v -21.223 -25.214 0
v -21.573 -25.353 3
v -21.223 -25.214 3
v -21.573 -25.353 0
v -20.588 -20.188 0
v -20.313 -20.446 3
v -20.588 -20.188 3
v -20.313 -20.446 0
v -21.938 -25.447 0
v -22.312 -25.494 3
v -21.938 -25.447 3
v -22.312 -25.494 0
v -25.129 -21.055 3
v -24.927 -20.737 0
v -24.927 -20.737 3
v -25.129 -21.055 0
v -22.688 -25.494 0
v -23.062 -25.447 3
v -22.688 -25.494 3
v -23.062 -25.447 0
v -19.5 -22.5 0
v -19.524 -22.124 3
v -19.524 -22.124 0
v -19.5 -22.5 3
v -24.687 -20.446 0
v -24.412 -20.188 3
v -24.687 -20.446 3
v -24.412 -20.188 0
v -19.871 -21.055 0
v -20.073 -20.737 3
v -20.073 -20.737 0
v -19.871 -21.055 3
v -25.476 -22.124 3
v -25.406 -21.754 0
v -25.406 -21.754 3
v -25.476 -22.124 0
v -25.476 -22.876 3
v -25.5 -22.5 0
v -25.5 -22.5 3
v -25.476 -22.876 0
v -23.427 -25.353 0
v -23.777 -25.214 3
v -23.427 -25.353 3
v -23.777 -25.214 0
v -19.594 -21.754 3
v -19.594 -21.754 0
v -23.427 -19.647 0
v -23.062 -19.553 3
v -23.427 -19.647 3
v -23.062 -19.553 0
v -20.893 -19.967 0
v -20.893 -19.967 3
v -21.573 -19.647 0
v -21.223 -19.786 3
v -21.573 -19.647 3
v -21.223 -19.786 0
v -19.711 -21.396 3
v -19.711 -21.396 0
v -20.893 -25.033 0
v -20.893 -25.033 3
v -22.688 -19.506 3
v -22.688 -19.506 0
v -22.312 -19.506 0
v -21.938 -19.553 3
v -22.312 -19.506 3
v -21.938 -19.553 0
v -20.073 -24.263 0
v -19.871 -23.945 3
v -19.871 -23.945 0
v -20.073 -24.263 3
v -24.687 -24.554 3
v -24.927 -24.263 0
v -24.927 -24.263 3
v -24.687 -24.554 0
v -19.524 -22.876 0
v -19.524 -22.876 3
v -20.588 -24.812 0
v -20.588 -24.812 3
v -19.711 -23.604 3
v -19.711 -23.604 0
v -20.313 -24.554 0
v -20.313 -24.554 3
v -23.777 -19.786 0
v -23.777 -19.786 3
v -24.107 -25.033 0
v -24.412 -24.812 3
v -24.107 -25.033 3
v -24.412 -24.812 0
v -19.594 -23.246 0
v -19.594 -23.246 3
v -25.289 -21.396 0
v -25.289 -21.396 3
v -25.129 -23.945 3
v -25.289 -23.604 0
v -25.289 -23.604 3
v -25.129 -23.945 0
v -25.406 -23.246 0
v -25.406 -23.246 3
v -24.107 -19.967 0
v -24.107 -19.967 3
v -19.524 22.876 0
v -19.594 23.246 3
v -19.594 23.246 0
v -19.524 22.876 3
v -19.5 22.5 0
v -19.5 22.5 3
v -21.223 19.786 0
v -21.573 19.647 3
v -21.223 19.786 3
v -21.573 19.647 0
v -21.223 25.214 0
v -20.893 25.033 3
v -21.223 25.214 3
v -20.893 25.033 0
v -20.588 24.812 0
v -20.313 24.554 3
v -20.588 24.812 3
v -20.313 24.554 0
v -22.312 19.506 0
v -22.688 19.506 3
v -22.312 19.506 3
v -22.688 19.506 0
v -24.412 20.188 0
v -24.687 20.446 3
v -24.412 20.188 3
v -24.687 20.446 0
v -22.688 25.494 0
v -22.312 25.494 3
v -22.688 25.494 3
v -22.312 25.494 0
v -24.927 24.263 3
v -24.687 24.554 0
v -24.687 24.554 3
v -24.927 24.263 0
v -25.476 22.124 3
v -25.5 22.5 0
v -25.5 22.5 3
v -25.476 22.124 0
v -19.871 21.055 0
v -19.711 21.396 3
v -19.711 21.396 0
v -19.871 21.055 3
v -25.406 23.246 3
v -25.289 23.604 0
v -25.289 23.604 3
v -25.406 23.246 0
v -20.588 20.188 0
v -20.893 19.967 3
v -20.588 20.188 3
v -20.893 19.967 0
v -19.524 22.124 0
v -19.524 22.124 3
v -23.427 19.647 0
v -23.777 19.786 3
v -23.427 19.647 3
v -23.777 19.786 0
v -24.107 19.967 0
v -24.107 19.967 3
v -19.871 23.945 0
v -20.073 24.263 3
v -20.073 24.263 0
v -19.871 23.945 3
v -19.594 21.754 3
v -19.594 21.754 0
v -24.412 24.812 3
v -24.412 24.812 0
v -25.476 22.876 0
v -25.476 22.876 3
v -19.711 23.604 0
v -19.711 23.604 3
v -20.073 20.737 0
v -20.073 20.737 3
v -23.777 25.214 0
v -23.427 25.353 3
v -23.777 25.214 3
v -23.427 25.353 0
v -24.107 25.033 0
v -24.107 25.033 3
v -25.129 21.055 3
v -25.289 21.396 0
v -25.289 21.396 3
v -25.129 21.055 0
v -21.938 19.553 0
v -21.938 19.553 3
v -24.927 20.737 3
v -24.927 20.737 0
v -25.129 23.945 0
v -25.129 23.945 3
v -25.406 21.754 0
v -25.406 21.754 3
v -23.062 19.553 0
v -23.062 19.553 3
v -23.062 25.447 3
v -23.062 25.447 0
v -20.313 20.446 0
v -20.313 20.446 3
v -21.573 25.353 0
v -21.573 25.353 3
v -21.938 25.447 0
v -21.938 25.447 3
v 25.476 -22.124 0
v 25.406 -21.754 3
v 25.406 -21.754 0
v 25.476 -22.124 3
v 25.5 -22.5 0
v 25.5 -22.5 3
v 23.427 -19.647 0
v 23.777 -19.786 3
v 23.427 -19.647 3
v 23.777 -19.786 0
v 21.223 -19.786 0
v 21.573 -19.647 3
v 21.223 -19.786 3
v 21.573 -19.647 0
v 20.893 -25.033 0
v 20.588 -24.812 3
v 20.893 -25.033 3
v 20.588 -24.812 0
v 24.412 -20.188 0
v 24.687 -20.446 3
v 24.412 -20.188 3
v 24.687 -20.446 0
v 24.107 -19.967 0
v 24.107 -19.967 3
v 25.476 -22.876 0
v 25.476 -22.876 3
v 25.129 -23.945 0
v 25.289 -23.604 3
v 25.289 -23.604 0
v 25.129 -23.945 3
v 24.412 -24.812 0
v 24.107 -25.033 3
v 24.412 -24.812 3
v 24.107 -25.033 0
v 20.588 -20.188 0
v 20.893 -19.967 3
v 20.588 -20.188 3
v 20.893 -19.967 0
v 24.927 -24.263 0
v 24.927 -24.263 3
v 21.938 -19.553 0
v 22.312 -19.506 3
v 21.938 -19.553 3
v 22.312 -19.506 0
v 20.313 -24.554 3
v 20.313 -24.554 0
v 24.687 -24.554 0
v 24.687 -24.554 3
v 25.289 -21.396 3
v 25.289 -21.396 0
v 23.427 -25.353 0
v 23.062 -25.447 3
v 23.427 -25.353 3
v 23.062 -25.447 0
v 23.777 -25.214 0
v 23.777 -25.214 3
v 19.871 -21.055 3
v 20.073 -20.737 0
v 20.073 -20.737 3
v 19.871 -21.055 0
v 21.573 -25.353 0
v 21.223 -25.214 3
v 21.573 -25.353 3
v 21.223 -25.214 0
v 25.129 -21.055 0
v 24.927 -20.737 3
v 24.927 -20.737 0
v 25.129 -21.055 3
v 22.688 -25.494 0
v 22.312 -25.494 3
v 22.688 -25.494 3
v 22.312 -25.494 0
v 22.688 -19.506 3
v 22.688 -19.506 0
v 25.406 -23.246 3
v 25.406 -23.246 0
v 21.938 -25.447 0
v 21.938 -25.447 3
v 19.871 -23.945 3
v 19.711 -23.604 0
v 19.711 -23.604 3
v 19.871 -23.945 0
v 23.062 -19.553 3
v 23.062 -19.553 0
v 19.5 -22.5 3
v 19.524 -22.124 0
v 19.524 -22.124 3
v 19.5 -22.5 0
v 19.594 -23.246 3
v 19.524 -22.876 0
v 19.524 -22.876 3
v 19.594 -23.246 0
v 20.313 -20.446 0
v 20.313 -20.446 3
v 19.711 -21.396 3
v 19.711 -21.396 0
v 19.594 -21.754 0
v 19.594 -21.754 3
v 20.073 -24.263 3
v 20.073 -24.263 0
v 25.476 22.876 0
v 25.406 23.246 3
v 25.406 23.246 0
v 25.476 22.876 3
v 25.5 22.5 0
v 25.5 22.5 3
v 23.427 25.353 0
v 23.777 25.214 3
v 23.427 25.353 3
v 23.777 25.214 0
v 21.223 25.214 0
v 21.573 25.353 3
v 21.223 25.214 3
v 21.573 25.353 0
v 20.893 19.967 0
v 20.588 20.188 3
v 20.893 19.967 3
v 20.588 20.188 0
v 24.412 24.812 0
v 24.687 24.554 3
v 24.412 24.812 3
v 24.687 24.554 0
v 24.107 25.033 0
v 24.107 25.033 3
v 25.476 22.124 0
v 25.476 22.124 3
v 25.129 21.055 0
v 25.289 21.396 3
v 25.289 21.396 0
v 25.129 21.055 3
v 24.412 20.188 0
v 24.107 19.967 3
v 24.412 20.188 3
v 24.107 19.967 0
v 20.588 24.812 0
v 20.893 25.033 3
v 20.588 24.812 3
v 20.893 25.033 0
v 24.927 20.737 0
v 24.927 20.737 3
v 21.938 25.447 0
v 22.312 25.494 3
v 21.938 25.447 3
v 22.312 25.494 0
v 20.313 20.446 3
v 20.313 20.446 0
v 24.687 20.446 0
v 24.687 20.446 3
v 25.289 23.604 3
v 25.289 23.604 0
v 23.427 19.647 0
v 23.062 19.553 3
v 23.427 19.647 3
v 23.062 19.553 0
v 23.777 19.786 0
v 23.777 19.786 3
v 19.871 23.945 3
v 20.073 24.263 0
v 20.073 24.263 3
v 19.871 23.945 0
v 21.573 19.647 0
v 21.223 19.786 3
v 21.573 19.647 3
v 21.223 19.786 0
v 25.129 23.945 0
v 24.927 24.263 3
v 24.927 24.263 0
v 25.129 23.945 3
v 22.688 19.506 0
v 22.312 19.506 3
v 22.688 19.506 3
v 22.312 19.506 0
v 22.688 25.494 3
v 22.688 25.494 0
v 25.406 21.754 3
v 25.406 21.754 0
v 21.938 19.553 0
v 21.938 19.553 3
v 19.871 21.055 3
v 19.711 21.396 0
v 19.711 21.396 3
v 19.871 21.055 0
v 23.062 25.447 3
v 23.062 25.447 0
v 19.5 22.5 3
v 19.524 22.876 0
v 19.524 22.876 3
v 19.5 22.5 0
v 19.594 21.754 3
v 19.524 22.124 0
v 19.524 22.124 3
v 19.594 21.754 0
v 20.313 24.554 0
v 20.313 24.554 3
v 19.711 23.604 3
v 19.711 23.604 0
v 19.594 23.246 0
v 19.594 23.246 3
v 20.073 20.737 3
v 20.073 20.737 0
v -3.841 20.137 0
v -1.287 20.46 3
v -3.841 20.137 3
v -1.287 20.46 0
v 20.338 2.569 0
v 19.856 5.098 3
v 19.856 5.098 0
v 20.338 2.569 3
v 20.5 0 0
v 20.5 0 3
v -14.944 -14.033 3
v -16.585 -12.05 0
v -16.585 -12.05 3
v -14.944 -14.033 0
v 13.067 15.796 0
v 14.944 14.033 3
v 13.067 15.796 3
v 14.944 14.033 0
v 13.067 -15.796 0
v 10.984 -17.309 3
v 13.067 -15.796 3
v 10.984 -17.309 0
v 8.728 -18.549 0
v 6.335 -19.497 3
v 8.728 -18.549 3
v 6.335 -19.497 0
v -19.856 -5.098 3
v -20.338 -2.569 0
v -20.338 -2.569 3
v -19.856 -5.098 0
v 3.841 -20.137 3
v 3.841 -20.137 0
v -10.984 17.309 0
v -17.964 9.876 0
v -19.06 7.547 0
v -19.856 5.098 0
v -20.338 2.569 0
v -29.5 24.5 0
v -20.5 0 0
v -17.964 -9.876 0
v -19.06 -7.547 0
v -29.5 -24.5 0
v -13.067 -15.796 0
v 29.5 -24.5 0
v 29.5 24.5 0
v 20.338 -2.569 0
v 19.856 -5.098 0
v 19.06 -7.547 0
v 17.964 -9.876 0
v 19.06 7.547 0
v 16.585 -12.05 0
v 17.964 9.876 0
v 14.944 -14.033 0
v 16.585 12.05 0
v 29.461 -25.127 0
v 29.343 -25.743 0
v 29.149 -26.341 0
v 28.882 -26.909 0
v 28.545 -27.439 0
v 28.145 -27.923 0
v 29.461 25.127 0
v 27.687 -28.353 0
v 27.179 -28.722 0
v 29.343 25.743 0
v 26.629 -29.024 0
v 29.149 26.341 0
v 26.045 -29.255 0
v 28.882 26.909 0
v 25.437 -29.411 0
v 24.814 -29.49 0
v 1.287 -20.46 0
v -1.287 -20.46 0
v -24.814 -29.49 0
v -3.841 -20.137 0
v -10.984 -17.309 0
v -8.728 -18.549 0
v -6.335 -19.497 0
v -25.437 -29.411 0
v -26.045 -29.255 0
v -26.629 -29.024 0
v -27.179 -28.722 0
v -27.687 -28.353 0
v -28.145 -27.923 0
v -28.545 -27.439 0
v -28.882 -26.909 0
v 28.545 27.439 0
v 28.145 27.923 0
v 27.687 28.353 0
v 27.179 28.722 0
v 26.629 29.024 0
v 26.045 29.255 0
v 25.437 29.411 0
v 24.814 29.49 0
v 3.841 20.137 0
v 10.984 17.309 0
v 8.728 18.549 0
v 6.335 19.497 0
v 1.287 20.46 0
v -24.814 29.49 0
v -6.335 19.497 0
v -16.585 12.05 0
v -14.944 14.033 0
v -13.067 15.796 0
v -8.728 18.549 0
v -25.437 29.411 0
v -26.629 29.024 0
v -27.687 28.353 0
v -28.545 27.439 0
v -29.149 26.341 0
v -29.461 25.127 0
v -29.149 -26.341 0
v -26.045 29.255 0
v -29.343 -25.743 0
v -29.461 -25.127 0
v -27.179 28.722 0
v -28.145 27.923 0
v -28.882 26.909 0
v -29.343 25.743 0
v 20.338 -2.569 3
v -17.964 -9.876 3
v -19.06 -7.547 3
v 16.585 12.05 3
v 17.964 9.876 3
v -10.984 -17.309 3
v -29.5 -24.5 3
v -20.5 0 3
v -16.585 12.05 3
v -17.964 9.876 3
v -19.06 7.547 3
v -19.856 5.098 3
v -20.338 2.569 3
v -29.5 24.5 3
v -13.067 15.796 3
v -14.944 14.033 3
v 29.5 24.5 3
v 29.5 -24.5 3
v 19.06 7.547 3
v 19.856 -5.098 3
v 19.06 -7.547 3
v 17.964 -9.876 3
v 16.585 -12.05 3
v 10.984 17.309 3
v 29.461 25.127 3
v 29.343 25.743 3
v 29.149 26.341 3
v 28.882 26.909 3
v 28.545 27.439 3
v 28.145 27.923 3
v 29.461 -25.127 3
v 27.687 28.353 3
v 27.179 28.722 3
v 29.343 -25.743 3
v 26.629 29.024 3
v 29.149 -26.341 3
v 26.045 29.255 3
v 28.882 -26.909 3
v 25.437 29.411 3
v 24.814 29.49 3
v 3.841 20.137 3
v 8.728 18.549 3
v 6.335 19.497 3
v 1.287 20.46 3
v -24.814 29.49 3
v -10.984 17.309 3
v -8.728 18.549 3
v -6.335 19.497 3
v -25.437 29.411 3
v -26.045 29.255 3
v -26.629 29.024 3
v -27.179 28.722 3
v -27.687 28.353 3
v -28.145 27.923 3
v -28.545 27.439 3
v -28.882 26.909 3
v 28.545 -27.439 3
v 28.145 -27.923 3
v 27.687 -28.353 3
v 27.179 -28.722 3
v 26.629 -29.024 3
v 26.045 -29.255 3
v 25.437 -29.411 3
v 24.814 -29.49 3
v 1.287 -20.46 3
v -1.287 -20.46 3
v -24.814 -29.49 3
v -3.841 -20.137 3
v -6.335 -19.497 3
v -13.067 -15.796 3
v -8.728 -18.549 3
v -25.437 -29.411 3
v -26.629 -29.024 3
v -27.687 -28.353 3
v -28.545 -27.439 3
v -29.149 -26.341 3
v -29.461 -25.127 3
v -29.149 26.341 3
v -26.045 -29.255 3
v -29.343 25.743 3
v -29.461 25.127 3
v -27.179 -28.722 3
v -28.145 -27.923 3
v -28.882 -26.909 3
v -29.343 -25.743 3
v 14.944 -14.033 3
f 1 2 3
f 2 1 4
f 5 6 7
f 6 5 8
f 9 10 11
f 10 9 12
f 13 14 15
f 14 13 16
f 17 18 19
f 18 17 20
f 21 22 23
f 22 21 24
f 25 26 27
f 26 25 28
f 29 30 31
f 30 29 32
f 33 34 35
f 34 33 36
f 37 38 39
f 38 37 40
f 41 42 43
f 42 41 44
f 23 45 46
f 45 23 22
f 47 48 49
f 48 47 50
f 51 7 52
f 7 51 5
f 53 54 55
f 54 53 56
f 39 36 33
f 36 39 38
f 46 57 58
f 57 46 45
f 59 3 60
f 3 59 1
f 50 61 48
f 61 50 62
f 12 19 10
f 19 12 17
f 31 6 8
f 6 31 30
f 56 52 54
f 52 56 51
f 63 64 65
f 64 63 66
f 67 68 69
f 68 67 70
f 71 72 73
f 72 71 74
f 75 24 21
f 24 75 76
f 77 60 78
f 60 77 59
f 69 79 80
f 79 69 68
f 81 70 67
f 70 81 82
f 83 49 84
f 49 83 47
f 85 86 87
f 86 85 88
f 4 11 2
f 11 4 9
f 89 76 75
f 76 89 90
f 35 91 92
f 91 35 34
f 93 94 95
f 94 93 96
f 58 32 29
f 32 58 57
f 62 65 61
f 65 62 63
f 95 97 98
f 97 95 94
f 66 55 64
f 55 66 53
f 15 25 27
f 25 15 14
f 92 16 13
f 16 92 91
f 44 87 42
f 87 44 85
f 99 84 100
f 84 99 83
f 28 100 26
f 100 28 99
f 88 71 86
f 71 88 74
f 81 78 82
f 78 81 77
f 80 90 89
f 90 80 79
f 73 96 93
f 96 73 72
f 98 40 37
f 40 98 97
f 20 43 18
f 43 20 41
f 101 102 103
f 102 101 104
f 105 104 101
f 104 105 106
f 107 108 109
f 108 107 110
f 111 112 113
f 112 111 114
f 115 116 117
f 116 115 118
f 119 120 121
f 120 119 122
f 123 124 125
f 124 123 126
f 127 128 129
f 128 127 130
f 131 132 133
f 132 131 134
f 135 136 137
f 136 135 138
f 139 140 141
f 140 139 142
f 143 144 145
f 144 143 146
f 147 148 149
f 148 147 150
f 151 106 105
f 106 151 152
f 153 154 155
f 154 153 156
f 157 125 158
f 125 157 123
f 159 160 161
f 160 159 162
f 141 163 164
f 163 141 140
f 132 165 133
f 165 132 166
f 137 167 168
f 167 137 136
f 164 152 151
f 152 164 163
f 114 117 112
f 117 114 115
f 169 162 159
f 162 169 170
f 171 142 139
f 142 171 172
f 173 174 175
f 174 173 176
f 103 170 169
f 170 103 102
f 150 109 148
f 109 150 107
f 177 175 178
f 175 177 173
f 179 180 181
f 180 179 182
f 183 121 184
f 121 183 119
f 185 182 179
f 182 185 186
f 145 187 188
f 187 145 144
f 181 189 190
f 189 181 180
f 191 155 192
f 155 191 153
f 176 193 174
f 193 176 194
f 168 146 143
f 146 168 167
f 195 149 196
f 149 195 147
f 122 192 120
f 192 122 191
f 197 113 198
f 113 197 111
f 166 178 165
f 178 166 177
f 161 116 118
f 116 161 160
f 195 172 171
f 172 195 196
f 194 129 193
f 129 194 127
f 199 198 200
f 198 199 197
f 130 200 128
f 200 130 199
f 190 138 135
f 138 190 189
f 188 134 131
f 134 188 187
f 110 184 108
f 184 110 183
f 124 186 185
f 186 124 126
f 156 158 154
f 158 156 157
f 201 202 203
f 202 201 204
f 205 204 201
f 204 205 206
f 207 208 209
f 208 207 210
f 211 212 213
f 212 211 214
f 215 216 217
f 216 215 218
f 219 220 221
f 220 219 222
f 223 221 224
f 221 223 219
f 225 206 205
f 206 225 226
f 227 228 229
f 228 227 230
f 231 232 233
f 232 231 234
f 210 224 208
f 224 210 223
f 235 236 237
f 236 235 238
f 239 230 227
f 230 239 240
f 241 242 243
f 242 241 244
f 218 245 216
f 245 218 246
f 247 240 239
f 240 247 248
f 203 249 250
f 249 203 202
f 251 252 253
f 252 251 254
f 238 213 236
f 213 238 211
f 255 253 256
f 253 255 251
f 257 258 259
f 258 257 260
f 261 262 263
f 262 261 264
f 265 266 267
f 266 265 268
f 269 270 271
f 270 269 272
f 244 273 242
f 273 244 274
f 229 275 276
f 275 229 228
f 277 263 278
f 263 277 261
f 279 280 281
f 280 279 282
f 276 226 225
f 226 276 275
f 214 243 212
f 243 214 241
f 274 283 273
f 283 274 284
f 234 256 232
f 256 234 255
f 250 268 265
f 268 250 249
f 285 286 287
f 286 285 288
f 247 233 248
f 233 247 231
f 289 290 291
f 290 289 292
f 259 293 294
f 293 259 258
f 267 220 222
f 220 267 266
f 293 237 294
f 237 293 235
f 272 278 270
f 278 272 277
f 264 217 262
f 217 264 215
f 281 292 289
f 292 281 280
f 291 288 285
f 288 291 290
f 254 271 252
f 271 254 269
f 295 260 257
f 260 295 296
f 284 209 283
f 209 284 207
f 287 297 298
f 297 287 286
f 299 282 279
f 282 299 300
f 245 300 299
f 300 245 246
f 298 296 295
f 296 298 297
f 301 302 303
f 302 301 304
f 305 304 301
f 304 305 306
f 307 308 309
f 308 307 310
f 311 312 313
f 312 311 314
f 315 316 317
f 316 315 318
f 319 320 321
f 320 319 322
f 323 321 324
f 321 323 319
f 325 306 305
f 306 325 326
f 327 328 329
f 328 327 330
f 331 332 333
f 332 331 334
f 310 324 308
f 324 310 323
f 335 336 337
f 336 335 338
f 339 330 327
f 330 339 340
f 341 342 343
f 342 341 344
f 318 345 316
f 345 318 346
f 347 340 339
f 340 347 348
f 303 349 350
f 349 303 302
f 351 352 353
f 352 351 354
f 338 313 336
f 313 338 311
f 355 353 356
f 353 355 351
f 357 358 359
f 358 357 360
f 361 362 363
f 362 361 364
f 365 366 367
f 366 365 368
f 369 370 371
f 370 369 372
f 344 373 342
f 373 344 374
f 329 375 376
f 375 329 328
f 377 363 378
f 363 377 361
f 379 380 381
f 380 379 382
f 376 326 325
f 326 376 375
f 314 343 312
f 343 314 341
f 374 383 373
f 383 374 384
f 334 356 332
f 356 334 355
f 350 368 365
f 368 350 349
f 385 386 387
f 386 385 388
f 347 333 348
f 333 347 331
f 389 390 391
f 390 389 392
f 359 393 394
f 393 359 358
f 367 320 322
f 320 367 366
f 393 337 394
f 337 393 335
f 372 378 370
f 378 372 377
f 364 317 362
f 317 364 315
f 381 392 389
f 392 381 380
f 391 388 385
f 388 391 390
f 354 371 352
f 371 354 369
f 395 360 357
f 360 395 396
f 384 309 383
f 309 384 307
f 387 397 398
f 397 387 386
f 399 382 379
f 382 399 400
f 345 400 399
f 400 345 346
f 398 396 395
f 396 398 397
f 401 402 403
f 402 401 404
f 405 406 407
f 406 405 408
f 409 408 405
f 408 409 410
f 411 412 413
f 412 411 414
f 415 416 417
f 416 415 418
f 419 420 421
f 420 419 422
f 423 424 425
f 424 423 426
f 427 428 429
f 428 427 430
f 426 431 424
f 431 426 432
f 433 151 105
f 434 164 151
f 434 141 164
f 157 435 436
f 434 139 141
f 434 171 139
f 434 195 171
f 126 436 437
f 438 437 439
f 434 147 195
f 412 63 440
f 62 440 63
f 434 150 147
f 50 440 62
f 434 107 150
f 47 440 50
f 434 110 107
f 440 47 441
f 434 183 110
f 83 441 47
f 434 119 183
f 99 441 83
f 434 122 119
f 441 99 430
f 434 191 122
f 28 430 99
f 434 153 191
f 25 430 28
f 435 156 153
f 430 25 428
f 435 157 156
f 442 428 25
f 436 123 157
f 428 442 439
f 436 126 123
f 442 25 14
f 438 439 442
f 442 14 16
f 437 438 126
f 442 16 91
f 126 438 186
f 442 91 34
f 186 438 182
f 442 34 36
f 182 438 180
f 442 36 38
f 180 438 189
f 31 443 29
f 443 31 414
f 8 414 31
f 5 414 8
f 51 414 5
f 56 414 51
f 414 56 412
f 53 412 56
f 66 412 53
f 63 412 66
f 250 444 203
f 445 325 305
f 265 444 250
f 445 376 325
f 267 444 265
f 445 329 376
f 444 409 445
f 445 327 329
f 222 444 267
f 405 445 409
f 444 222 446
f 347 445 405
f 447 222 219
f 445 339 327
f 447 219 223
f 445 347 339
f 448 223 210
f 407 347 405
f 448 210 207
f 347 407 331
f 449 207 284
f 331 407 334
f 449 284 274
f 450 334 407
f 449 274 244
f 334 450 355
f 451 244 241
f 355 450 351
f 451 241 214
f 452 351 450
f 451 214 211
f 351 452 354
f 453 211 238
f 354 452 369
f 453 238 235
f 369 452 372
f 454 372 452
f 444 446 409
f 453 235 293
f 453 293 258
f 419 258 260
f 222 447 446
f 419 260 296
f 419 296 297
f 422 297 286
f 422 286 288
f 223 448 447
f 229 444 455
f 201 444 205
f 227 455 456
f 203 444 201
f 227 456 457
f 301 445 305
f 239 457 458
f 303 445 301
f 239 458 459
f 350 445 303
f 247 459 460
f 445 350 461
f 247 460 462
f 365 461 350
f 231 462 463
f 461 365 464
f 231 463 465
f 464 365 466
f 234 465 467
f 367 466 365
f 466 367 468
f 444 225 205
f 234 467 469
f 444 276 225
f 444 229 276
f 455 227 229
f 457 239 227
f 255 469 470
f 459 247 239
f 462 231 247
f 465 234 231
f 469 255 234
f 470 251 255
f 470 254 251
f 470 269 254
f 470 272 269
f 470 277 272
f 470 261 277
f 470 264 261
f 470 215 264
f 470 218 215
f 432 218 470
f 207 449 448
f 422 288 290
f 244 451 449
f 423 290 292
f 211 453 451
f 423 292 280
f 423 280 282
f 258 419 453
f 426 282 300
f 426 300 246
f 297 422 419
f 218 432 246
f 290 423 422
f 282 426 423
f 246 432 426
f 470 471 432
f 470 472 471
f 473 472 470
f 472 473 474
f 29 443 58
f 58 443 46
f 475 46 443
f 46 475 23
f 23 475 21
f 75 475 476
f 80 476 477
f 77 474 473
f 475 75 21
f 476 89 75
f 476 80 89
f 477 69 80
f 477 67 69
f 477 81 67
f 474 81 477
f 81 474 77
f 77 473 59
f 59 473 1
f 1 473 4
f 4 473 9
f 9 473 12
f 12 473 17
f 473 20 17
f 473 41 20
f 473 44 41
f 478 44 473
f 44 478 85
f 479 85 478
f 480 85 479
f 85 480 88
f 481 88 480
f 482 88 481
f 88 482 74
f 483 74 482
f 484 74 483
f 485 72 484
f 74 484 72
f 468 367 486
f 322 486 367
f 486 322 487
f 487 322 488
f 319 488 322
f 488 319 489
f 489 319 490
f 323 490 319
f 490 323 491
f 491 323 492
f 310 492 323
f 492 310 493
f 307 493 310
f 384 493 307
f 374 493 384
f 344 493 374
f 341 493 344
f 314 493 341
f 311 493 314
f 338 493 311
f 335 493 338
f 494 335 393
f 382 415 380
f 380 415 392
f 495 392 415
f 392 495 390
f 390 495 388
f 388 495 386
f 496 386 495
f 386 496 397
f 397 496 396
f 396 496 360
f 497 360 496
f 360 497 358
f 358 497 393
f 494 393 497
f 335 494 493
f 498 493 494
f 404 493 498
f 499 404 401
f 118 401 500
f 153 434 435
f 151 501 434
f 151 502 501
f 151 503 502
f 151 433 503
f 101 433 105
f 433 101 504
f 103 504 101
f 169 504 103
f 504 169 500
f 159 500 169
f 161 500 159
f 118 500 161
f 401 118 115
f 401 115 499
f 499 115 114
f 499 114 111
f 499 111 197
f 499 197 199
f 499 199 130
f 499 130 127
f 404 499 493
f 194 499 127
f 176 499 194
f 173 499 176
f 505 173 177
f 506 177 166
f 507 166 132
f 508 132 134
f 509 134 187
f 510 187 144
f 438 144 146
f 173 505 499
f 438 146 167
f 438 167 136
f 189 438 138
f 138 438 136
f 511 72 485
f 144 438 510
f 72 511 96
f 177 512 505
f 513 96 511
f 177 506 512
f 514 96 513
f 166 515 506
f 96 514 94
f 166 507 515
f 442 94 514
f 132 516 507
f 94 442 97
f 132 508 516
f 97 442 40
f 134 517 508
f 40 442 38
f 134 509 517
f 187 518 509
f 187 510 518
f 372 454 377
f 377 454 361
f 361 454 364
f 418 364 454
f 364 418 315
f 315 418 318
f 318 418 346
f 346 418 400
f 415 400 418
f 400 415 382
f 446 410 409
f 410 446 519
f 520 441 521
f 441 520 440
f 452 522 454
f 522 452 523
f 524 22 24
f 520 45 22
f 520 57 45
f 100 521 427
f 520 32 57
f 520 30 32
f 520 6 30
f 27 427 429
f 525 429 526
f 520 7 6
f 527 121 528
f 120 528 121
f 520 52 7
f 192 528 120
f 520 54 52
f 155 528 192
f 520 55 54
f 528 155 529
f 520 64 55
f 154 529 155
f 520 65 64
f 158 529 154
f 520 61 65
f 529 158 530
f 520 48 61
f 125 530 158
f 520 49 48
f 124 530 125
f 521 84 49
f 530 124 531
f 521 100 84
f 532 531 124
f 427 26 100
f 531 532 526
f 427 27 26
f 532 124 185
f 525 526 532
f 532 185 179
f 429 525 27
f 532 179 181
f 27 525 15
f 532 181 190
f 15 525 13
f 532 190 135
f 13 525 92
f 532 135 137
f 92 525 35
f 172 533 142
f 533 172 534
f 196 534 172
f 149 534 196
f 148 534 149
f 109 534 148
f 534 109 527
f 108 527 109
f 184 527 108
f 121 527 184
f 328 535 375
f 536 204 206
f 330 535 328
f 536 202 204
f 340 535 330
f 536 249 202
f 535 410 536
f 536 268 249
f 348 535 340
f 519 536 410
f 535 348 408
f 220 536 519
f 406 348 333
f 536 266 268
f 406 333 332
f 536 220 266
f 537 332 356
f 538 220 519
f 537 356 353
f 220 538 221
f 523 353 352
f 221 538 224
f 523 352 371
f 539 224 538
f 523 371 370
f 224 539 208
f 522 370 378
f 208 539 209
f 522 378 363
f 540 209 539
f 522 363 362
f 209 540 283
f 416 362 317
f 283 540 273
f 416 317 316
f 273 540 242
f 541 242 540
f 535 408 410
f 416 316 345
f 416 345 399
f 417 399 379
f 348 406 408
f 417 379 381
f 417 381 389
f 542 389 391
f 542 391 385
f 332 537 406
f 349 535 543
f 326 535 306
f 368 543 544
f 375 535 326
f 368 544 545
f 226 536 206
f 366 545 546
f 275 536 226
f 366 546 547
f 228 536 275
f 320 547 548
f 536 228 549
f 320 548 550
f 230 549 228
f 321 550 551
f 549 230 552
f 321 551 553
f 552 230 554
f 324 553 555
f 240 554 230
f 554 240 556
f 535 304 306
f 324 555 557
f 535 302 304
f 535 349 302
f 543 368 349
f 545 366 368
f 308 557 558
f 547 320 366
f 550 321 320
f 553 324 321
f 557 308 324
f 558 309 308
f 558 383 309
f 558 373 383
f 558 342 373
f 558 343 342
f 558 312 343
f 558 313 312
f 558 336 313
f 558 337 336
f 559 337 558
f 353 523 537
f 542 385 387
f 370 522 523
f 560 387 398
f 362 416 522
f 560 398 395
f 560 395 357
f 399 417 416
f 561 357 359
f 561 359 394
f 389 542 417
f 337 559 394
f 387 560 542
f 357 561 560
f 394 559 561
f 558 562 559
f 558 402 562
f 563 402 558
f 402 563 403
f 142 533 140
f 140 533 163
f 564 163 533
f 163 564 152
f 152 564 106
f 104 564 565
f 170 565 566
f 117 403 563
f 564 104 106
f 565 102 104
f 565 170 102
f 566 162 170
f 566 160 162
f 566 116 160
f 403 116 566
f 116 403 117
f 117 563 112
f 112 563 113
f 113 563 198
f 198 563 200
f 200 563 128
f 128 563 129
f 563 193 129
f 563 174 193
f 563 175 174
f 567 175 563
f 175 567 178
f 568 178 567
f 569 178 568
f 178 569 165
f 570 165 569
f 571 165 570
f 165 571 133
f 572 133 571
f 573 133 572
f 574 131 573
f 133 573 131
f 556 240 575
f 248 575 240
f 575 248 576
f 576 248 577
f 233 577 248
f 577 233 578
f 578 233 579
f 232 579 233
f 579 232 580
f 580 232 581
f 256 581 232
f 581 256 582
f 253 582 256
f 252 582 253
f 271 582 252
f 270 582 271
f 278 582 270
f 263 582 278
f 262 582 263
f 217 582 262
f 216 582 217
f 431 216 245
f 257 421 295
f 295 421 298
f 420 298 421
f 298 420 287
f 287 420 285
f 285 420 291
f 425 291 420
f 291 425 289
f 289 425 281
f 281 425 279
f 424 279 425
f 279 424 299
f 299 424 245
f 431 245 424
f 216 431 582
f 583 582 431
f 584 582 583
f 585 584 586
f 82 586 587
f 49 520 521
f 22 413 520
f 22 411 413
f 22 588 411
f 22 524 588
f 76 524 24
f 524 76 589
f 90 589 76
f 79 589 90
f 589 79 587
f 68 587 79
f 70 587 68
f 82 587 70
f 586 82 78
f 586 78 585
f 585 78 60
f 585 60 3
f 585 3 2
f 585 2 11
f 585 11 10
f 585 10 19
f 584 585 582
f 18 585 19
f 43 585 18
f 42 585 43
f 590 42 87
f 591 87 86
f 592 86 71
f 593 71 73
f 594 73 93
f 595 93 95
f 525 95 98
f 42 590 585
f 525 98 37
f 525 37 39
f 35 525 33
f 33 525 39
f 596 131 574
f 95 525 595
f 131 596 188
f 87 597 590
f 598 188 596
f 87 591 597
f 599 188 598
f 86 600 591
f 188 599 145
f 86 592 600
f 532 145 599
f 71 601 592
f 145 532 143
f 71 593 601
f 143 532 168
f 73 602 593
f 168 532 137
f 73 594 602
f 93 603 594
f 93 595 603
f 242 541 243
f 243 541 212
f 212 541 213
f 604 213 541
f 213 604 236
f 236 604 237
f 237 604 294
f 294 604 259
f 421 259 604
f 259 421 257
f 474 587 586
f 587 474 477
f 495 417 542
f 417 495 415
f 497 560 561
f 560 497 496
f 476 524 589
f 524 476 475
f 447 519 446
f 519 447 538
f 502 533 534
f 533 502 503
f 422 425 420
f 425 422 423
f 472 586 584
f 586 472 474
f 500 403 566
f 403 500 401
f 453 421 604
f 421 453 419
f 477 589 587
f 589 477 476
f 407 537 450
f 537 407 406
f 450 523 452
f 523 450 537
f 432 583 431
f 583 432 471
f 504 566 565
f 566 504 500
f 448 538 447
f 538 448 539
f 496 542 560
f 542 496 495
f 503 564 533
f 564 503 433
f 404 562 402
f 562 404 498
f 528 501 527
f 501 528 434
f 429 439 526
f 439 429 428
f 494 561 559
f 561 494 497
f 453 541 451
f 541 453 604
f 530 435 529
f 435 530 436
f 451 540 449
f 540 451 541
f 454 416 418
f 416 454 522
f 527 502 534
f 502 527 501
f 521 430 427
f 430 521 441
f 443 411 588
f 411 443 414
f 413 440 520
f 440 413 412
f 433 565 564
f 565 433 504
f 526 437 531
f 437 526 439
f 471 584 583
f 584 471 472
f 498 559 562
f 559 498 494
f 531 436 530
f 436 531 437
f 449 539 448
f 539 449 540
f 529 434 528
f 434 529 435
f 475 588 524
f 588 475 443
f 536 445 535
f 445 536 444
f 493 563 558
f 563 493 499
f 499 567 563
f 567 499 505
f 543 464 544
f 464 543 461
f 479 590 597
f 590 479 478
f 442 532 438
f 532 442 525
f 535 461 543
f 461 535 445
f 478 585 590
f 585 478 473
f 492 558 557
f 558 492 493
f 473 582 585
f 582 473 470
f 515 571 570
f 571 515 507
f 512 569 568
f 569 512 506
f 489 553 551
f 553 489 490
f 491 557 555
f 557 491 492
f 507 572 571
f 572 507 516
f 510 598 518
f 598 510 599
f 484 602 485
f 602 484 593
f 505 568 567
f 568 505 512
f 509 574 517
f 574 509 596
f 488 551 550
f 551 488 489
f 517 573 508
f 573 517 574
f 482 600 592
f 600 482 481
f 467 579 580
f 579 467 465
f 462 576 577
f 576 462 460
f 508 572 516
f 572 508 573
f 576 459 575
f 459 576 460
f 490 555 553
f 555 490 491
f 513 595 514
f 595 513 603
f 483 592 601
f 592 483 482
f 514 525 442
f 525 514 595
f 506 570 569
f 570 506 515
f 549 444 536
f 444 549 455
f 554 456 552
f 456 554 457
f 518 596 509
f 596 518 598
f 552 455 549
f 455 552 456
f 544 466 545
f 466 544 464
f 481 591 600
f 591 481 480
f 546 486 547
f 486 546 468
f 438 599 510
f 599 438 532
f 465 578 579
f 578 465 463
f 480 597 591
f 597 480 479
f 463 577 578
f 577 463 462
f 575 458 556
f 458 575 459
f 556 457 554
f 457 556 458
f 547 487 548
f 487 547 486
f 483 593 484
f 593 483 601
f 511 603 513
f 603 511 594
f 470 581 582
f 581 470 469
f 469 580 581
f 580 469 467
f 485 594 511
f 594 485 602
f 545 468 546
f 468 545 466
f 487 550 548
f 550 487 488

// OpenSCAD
$fn = 50;


difference() {
	union() {
		hull() {
			translate(v = [-24.5000000000, 24.5000000000, 0]) {
				cylinder(h = 3, r = 5);
			}
			translate(v = [24.5000000000, 24.5000000000, 0]) {
				cylinder(h = 3, r = 5);
			}
			translate(v = [-24.5000000000, -24.5000000000, 0]) {
				cylinder(h = 3, r = 5);
			}
			translate(v = [24.5000000000, -24.5000000000, 0]) {
				cylinder(h = 3, r = 5);
			}
		}
	}
	union() {
		#translate(v = [-22.5000000000, -22.5000000000, -100.0000000000]) {
			cylinder(h = 200, r = 3.0000000000);
		}
		#translate(v = [-22.5000000000, 22.5000000000, -100.0000000000]) {
			cylinder(h = 200, r = 3.0000000000);
		}
		#translate(v = [22.5000000000, -22.5000000000, -100.0000000000]) {
			cylinder(h = 200, r = 3.0000000000);
		}
		#translate(v = [22.5000000000, 22.5000000000, -100.0000000000]) {
			cylinder(h = 200, r = 3.0000000000);
		}
		#cylinder(h = 3, r = 20.5000000000);
	}
}
